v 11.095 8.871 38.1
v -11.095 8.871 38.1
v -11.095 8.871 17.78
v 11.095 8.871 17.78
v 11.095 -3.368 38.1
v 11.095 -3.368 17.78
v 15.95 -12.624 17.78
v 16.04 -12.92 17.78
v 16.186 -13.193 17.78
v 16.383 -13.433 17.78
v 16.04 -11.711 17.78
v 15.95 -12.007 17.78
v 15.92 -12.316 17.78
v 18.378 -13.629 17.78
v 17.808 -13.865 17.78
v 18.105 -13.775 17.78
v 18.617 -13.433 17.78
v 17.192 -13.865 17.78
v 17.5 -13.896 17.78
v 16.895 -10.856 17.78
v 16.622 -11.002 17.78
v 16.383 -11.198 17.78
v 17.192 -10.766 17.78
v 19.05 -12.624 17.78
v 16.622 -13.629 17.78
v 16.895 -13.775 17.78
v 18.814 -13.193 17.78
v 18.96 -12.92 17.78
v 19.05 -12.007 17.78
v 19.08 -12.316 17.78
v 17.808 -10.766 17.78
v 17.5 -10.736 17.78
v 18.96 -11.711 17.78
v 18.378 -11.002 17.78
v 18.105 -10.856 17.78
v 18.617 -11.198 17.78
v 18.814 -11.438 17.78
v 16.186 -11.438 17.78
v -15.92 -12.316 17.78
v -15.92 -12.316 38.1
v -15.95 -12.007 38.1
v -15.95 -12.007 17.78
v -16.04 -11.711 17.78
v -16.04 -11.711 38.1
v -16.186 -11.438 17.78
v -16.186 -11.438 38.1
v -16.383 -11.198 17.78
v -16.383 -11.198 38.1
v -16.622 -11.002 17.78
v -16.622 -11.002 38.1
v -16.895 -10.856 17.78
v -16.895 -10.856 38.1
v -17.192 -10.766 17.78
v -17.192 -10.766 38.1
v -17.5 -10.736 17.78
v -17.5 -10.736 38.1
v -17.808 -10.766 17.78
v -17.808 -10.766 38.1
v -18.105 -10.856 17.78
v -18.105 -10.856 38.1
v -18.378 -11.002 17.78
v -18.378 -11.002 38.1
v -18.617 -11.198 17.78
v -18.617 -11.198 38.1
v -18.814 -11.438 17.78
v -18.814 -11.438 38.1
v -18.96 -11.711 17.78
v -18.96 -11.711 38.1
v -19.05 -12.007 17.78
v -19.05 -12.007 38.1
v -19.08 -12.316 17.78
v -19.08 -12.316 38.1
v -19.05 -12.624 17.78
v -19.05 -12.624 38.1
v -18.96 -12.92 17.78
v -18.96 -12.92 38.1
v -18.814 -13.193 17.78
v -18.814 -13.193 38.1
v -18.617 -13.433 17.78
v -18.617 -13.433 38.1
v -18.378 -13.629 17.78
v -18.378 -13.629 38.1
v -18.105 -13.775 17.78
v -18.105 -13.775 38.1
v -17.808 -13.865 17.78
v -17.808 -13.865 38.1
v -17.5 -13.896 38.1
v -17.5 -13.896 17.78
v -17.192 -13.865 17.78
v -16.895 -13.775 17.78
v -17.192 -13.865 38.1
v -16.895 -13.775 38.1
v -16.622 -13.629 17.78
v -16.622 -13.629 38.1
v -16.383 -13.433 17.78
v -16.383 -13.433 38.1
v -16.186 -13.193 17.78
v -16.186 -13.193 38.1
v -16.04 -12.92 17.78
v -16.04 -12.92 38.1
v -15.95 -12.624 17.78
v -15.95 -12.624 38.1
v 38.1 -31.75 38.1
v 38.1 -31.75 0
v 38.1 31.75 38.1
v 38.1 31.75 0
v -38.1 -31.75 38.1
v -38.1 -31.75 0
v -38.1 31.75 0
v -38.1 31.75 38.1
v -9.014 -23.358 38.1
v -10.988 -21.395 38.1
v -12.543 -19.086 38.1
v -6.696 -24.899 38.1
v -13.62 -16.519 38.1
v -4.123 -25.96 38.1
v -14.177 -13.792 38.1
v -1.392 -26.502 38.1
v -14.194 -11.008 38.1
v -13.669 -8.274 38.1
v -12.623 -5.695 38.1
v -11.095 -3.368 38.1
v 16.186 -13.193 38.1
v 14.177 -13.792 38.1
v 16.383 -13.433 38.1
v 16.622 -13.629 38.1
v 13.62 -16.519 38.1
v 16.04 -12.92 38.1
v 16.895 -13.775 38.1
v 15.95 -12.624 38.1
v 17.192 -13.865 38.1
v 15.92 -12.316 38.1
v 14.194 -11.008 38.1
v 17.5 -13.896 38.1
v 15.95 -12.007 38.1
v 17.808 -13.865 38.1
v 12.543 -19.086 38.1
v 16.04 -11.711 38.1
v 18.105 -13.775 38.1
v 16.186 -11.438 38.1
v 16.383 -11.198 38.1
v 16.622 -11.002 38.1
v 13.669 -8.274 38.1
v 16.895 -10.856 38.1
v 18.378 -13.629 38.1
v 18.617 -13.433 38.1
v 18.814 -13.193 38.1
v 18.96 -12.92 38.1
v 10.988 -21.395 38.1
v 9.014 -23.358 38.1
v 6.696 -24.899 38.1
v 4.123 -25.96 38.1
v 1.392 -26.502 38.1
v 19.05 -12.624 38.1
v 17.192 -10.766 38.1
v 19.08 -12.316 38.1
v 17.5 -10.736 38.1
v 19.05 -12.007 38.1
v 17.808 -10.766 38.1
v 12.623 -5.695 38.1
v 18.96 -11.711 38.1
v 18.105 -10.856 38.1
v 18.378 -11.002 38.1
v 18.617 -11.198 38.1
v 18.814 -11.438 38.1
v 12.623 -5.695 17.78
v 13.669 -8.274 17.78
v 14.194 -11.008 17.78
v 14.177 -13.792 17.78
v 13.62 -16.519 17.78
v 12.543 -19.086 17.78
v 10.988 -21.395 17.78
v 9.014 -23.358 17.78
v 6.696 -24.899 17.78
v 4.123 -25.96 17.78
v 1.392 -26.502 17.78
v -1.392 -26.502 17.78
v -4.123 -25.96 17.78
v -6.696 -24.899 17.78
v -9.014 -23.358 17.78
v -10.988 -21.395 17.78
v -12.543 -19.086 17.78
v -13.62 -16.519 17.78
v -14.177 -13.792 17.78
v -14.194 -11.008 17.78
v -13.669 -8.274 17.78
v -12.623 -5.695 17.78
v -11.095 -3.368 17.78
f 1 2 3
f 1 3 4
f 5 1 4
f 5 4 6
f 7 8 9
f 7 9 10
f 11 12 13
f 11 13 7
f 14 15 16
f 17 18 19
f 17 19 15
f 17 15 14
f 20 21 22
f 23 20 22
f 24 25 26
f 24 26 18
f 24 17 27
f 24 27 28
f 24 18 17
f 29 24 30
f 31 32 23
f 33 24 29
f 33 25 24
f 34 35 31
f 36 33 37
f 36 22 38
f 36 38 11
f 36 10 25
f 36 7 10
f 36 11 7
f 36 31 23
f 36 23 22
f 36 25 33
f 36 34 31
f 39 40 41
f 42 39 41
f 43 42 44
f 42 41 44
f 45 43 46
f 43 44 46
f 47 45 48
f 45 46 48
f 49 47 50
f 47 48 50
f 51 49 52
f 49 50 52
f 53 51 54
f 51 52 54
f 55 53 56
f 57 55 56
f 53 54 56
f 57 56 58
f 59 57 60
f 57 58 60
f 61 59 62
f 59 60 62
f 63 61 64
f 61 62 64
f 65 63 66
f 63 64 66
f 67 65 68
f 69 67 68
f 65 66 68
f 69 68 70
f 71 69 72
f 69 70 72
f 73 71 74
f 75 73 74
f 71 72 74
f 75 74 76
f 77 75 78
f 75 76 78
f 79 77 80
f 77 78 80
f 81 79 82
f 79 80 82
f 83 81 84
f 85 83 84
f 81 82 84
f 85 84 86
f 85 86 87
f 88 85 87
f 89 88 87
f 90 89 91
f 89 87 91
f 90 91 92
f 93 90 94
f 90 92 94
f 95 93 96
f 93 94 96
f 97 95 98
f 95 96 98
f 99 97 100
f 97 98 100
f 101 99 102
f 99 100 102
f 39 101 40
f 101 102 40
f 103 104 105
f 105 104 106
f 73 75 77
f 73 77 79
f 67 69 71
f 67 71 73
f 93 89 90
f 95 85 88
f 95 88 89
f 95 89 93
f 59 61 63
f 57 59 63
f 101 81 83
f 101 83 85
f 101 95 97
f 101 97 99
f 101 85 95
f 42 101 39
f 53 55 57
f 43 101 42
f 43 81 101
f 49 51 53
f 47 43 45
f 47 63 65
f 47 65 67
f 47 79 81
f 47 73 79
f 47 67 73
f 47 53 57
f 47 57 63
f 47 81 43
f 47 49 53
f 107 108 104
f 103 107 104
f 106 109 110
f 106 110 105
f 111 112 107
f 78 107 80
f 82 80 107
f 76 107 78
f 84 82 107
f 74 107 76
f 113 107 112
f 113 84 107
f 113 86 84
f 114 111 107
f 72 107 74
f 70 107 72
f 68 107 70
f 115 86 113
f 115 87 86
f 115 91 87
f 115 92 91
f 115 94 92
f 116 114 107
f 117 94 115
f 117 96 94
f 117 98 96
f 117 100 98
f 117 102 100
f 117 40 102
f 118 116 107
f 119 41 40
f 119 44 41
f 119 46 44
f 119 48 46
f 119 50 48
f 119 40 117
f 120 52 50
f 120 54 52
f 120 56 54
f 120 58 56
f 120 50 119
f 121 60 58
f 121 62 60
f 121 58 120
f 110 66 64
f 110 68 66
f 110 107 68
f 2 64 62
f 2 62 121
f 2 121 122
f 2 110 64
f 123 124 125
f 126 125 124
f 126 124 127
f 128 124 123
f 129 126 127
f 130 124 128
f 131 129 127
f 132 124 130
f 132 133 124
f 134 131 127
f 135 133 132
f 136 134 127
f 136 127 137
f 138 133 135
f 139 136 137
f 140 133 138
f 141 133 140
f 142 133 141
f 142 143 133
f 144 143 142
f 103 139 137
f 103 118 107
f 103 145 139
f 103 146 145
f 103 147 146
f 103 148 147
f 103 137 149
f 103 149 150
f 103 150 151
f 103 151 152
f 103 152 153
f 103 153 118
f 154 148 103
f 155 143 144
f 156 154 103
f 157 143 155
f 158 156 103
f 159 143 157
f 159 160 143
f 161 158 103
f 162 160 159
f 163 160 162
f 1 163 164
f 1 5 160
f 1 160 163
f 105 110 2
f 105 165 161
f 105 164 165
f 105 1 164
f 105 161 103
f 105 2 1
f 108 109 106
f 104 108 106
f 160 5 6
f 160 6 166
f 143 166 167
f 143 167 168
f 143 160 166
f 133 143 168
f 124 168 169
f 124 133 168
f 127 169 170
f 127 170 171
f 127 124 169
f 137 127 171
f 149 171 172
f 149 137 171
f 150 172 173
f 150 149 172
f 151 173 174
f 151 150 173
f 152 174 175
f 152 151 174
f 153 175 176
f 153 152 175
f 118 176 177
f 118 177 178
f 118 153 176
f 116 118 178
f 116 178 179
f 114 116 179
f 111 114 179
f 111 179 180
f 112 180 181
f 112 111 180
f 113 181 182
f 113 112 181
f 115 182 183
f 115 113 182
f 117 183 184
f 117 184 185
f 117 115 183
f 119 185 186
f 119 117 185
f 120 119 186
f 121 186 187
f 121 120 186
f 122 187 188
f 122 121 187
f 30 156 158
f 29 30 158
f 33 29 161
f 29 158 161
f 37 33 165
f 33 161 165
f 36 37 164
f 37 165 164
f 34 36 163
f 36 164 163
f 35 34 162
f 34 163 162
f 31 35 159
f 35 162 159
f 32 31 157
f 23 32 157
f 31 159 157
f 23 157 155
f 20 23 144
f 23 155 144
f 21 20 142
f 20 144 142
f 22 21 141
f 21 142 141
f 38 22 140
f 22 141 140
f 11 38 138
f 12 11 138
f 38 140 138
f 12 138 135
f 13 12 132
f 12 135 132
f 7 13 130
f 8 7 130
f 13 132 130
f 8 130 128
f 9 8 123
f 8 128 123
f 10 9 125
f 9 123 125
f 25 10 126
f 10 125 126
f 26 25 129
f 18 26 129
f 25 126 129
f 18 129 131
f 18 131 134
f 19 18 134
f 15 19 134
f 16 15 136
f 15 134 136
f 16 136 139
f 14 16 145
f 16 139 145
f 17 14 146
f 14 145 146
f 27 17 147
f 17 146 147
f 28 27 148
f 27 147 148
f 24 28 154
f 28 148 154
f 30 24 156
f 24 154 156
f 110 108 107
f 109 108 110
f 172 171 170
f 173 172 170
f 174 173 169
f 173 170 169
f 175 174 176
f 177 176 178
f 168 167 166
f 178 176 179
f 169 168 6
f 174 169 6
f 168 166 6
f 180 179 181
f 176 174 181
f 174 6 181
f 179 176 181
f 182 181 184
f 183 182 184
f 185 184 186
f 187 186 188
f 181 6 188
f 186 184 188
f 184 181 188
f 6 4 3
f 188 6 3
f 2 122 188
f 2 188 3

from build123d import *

# Parameters (mm, degrees)
SKETCH1_W           = 76.2
SKETCH1_H           = 63.5
BOSS_EXTRUDE1_DEPTH = 38.1
CUT_EXTRUDE2_DEPTH  = 20.32
SKETCH6_R           = 1.58
CUT_EXTRUDE3_DEPTH  = 20.32


with BuildPart() as part:
    # Sketch1 → Boss-Extrude1 (new body)
    with BuildSketch(Plane.XY):
        Rectangle(SKETCH1_W, SKETCH1_H)
    extrude(amount=BOSS_EXTRUDE1_DEPTH)

    # Sketch5 → Cut-Extrude2 (cut)
    with BuildSketch(Plane.XY.offset(38.1)):
        with BuildLine():
            Line((-11.095417071, -3.367534501), (-11.095417071, 8.870920326))
            Line((-11.095417071, 8.870920326), (11.095417071, 8.870920326))
            Line((11.095417071, 8.870920326), (11.095417071, -3.367534501))
            ThreePointArc((11.095417071, -3.367534501), (0, -26.569619951), (-11.095417071, -3.367534501))
        make_face()
    extrude(amount=-CUT_EXTRUDE2_DEPTH, mode=Mode.SUBTRACT)

    # Sketch6 → Cut-Extrude3 (cut)
    with BuildSketch(Plane.XY.offset(38.1)):
        with Locations((17.5, -12.315620011)):
            Circle(SKETCH6_R)
        with Locations((-17.5, -12.315620011)):
            Circle(SKETCH6_R)
    extrude(amount=-CUT_EXTRUDE3_DEPTH, mode=Mode.SUBTRACT)


solid = part.part
